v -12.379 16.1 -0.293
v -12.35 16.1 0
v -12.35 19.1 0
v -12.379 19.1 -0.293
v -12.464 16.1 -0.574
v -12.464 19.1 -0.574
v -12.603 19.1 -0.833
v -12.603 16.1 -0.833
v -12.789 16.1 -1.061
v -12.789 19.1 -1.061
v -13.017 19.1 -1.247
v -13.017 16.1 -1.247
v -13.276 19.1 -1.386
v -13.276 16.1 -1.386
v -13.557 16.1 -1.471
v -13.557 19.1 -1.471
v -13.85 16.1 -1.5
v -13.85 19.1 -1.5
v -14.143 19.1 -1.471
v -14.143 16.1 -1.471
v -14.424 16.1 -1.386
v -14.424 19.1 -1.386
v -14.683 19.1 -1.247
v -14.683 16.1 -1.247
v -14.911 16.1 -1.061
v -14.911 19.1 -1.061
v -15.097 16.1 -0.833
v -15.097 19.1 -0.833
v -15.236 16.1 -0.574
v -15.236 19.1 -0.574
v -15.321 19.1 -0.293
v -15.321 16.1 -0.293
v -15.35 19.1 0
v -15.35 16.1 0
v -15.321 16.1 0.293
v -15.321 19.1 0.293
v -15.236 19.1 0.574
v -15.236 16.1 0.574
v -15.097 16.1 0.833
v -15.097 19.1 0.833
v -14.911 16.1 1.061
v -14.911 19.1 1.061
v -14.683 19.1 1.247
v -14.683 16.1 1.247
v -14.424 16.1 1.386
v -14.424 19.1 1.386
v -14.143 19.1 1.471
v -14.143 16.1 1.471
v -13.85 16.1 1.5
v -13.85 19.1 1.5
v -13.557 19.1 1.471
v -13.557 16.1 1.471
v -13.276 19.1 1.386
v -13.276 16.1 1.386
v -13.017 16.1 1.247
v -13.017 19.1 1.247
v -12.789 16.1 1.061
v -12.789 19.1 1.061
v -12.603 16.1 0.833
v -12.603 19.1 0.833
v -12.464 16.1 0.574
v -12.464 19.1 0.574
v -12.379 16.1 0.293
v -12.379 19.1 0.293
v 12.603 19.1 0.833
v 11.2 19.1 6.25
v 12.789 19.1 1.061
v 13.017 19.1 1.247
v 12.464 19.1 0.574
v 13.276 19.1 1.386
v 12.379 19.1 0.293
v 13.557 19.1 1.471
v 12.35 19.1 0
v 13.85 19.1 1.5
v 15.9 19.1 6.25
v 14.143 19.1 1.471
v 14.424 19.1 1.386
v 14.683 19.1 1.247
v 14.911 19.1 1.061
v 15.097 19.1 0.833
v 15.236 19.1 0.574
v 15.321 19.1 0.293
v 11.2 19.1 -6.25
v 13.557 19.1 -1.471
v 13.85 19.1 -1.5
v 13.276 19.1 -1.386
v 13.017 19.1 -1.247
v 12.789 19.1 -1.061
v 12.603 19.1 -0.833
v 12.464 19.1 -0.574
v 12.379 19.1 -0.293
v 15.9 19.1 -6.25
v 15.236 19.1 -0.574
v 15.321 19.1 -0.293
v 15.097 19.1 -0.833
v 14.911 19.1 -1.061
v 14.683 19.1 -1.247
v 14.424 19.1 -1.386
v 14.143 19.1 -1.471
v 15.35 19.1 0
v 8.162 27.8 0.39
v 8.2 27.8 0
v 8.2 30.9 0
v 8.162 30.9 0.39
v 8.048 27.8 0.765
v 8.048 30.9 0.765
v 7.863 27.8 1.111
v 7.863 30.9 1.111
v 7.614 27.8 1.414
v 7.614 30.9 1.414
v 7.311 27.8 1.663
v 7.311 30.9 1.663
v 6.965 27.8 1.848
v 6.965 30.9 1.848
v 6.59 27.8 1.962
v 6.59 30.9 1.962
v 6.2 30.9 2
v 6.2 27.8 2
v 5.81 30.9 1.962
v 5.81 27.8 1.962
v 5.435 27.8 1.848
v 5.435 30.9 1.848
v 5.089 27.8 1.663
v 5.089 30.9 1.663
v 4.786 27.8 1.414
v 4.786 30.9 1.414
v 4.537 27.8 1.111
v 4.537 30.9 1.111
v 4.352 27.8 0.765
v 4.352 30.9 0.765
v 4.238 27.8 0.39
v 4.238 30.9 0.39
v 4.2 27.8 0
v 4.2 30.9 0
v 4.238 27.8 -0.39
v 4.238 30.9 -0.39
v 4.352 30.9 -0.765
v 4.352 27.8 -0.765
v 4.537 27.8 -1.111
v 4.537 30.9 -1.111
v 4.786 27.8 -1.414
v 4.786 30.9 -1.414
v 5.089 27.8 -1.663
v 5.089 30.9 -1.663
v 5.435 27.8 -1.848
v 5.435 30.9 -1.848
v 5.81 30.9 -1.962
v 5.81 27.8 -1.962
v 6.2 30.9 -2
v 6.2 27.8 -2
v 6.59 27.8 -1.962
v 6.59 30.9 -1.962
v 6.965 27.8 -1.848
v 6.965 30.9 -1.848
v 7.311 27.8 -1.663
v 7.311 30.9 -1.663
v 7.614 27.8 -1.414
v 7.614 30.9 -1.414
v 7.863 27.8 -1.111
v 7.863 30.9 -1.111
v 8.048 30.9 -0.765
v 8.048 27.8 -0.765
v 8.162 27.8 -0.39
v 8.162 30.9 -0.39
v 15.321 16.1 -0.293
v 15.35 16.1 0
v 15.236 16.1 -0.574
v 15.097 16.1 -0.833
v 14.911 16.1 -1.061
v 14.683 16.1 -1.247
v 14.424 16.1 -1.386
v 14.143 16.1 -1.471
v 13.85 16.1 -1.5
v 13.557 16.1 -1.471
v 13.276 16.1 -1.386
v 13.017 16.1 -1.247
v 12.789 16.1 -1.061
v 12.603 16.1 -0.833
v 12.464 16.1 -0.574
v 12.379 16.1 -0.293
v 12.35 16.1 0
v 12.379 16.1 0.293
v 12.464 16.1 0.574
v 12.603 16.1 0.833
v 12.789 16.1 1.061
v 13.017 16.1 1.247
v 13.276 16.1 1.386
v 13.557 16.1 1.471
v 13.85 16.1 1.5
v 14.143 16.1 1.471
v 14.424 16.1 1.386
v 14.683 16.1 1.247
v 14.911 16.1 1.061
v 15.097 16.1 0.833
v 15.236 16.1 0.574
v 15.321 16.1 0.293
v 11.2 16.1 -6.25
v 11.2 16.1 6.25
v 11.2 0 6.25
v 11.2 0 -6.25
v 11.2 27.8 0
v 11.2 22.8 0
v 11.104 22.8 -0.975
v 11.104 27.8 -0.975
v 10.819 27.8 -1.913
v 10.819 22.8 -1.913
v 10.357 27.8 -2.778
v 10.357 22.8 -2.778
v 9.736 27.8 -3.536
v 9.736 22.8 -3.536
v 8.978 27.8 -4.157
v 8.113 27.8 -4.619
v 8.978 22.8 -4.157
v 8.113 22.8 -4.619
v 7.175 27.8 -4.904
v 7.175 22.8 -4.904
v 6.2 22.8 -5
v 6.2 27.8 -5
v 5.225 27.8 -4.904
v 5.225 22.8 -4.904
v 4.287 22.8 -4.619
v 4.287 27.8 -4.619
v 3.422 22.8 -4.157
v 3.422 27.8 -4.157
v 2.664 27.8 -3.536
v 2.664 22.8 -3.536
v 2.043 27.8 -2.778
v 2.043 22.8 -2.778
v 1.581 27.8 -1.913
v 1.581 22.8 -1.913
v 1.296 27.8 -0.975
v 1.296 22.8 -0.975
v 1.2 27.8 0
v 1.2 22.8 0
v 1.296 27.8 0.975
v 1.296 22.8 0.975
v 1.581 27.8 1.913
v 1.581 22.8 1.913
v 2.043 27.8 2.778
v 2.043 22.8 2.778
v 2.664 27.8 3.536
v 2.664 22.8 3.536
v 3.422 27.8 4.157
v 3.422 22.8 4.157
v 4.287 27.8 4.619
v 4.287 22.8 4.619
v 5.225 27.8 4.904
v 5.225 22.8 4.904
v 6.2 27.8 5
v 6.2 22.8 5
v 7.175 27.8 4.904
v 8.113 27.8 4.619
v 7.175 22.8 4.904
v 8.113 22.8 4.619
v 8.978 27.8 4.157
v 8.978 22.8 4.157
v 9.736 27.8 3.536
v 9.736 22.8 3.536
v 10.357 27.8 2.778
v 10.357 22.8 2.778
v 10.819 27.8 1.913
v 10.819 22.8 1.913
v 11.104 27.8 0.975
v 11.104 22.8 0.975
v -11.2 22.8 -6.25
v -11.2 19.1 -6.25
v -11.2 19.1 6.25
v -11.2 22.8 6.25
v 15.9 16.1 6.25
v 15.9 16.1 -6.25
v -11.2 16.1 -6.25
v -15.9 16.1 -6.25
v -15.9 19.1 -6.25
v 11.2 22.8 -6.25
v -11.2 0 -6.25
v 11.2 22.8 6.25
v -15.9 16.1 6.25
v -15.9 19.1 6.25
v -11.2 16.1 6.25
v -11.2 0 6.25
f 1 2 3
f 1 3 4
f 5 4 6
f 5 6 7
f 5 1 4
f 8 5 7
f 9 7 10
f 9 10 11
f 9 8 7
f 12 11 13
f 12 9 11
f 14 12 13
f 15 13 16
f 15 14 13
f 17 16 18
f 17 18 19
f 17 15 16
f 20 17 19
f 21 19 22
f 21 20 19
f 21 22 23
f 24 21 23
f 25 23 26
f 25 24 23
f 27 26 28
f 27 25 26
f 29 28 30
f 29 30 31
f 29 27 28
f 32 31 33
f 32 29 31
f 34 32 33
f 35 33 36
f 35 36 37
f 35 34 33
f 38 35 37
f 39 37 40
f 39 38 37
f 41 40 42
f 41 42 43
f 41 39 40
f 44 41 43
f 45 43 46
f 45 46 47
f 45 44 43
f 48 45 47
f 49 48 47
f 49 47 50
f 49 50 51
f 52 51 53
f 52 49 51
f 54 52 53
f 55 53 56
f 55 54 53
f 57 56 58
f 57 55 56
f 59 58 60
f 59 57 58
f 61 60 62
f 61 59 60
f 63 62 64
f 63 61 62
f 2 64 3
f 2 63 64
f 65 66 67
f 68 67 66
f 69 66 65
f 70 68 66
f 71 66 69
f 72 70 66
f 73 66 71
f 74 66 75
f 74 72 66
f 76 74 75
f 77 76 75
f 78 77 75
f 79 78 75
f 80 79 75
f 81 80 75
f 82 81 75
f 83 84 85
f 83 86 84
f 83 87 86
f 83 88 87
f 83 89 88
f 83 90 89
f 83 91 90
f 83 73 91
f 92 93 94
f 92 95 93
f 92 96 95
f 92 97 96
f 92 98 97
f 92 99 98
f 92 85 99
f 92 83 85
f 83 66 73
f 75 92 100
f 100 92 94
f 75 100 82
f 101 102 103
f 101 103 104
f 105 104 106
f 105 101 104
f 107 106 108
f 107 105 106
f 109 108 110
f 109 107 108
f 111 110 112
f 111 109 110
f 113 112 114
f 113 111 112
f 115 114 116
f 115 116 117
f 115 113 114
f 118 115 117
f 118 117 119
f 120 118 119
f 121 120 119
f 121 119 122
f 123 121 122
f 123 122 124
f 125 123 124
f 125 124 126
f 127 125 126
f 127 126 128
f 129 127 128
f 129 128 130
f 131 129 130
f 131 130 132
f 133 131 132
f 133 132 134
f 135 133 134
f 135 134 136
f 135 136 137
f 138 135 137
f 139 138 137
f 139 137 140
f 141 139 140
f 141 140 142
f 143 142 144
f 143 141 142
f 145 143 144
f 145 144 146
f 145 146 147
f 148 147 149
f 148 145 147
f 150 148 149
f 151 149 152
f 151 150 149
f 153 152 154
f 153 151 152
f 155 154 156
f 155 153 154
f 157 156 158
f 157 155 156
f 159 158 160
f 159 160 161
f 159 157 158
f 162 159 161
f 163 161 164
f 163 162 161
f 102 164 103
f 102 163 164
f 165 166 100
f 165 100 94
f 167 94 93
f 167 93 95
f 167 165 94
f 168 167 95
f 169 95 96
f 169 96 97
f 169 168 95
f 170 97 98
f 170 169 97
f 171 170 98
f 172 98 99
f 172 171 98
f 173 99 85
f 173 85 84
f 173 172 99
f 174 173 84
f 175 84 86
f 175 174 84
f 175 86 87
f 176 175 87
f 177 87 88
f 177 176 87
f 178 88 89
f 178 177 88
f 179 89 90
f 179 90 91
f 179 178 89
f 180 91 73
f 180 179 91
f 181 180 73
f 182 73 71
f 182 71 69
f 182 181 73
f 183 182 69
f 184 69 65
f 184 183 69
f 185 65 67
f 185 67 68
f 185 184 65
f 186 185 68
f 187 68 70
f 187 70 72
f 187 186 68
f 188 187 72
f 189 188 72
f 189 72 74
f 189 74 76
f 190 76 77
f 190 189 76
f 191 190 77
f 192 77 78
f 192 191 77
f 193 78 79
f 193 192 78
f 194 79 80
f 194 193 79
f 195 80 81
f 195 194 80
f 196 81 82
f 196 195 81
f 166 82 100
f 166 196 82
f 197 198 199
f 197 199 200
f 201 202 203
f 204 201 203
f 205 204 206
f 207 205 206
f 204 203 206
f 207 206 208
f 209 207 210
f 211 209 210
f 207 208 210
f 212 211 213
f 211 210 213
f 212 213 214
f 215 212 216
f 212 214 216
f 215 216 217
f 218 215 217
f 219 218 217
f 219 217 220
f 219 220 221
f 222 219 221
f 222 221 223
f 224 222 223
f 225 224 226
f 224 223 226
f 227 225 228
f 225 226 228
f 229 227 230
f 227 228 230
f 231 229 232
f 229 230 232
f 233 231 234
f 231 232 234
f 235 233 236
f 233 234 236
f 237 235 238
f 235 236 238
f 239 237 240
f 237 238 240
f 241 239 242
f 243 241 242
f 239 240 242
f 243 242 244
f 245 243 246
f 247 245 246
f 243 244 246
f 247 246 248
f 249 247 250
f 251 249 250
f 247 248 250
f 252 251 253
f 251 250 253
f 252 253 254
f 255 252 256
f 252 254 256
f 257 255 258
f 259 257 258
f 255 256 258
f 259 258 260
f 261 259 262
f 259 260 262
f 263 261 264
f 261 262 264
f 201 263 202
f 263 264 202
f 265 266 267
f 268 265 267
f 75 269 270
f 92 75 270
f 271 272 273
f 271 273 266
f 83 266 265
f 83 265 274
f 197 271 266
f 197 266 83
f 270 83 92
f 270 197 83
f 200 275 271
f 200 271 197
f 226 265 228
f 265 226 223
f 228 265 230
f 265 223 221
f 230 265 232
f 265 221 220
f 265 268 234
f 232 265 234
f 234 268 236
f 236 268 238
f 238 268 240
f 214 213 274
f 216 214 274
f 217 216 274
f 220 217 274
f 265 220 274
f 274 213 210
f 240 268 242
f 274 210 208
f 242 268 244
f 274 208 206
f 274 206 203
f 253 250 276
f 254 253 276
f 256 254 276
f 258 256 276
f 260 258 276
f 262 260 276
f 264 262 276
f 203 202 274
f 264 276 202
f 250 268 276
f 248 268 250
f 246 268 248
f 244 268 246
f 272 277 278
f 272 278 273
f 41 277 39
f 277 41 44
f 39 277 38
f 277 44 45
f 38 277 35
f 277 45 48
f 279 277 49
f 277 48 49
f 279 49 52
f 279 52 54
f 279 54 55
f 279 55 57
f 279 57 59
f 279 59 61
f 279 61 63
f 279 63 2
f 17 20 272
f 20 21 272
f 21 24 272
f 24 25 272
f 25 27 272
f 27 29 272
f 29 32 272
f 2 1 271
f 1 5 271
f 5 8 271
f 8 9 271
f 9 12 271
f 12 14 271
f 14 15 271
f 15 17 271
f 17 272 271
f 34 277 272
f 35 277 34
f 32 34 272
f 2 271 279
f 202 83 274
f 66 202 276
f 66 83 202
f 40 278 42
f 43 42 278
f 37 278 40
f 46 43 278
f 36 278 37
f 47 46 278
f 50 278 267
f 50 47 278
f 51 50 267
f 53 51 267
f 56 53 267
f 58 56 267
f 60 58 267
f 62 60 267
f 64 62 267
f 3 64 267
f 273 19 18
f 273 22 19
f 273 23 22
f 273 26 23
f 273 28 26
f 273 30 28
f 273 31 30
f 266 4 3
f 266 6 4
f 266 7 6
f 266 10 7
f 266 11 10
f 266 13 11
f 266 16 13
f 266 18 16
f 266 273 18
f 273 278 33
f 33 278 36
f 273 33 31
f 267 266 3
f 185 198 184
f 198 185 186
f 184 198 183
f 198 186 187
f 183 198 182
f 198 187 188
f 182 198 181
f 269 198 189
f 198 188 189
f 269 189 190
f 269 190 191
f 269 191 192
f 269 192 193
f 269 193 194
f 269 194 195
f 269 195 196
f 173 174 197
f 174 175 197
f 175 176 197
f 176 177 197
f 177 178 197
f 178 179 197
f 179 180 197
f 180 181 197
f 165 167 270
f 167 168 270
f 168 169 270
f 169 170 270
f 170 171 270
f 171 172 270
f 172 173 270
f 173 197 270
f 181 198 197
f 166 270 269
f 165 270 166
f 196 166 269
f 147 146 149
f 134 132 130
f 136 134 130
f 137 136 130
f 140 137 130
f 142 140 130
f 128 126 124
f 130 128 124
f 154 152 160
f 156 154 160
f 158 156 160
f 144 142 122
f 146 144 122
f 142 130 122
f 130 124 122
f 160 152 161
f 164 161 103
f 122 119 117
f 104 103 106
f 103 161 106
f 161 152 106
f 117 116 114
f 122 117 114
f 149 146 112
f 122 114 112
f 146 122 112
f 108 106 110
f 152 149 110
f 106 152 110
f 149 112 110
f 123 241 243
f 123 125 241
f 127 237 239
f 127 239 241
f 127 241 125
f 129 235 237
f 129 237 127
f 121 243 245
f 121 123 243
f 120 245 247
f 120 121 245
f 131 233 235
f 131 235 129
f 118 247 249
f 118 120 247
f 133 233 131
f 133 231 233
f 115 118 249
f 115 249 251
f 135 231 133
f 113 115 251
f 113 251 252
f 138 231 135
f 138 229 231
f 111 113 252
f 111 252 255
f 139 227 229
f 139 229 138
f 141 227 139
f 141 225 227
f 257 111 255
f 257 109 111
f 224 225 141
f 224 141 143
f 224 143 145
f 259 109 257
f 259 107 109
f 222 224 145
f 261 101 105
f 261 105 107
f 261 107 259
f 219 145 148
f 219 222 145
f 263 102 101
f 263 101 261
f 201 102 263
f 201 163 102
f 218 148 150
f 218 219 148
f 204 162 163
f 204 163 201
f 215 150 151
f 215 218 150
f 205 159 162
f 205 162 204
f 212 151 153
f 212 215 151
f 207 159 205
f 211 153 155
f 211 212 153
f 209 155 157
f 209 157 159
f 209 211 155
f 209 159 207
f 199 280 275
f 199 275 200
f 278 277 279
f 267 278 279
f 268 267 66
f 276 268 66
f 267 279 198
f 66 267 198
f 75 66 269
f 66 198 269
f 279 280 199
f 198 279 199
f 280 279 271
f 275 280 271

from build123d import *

# Parameters (mm, degrees)
SKETCH_1_W      = 22.4
SKETCH_1_H      = 12.5
EXTRUDE_1_DEPTH = 16.1
SKETCH_2_W      = 31.8
SKETCH_2_H      = 12.5
SKETCH_2_R      = 1.5
EXTRUDE_2_DEPTH = 3
SKETCH_3_W      = 22.4
SKETCH_3_H      = 12.5
EXTRUDE_3_DEPTH = 22.8
SKETCH_4_R      = 5
EXTRUDE_4_DEPTH = 5
SKETCH_5_R      = 2
EXTRUDE_5_DEPTH = 30.9


with BuildPart() as part:
    # 草图1 → 凸台-拉伸1 (new body)
    with BuildSketch(Plane(origin=(0, 0, 0), x_dir=(1, 0, 0), z_dir=(0, 1, 0))):
        Rectangle(SKETCH_1_W, SKETCH_1_H)
    extrude(amount=EXTRUDE_1_DEPTH)

    # 草图2 → 凸台-拉伸2 (add)
    with BuildSketch(Plane(origin=(0, 16.1, 0), x_dir=(1, 0, 0), z_dir=(0, 1, 0))):
        Rectangle(SKETCH_2_W, SKETCH_2_H)
        with Locations((13.85, 0)):
            Circle(SKETCH_2_R, mode=Mode.SUBTRACT)
        with Locations((-13.85, 0)):
            Circle(SKETCH_2_R, mode=Mode.SUBTRACT)
    extrude(amount=EXTRUDE_2_DEPTH)

    # 草图3 → 凸台-拉伸3 (add)
    with BuildSketch(Plane.XZ):
        Rectangle(SKETCH_3_W, SKETCH_3_H)
    extrude(amount=-EXTRUDE_3_DEPTH)

    # 草图4 → 凸台-拉伸4 (add)
    with BuildSketch(Plane(origin=(0, 22.8, 0), x_dir=(1, 0, 0), z_dir=(0, 1, 0))):
        with Locations((6.2, 0)):
            Circle(SKETCH_4_R)
    extrude(amount=EXTRUDE_4_DEPTH)

    # 草图5 → 凸台-拉伸5 (add)
    with BuildSketch(Plane.XZ):
        with Locations((6.2, 0)):
            Circle(SKETCH_5_R)
    extrude(amount=-EXTRUDE_5_DEPTH)


solid = part.part
